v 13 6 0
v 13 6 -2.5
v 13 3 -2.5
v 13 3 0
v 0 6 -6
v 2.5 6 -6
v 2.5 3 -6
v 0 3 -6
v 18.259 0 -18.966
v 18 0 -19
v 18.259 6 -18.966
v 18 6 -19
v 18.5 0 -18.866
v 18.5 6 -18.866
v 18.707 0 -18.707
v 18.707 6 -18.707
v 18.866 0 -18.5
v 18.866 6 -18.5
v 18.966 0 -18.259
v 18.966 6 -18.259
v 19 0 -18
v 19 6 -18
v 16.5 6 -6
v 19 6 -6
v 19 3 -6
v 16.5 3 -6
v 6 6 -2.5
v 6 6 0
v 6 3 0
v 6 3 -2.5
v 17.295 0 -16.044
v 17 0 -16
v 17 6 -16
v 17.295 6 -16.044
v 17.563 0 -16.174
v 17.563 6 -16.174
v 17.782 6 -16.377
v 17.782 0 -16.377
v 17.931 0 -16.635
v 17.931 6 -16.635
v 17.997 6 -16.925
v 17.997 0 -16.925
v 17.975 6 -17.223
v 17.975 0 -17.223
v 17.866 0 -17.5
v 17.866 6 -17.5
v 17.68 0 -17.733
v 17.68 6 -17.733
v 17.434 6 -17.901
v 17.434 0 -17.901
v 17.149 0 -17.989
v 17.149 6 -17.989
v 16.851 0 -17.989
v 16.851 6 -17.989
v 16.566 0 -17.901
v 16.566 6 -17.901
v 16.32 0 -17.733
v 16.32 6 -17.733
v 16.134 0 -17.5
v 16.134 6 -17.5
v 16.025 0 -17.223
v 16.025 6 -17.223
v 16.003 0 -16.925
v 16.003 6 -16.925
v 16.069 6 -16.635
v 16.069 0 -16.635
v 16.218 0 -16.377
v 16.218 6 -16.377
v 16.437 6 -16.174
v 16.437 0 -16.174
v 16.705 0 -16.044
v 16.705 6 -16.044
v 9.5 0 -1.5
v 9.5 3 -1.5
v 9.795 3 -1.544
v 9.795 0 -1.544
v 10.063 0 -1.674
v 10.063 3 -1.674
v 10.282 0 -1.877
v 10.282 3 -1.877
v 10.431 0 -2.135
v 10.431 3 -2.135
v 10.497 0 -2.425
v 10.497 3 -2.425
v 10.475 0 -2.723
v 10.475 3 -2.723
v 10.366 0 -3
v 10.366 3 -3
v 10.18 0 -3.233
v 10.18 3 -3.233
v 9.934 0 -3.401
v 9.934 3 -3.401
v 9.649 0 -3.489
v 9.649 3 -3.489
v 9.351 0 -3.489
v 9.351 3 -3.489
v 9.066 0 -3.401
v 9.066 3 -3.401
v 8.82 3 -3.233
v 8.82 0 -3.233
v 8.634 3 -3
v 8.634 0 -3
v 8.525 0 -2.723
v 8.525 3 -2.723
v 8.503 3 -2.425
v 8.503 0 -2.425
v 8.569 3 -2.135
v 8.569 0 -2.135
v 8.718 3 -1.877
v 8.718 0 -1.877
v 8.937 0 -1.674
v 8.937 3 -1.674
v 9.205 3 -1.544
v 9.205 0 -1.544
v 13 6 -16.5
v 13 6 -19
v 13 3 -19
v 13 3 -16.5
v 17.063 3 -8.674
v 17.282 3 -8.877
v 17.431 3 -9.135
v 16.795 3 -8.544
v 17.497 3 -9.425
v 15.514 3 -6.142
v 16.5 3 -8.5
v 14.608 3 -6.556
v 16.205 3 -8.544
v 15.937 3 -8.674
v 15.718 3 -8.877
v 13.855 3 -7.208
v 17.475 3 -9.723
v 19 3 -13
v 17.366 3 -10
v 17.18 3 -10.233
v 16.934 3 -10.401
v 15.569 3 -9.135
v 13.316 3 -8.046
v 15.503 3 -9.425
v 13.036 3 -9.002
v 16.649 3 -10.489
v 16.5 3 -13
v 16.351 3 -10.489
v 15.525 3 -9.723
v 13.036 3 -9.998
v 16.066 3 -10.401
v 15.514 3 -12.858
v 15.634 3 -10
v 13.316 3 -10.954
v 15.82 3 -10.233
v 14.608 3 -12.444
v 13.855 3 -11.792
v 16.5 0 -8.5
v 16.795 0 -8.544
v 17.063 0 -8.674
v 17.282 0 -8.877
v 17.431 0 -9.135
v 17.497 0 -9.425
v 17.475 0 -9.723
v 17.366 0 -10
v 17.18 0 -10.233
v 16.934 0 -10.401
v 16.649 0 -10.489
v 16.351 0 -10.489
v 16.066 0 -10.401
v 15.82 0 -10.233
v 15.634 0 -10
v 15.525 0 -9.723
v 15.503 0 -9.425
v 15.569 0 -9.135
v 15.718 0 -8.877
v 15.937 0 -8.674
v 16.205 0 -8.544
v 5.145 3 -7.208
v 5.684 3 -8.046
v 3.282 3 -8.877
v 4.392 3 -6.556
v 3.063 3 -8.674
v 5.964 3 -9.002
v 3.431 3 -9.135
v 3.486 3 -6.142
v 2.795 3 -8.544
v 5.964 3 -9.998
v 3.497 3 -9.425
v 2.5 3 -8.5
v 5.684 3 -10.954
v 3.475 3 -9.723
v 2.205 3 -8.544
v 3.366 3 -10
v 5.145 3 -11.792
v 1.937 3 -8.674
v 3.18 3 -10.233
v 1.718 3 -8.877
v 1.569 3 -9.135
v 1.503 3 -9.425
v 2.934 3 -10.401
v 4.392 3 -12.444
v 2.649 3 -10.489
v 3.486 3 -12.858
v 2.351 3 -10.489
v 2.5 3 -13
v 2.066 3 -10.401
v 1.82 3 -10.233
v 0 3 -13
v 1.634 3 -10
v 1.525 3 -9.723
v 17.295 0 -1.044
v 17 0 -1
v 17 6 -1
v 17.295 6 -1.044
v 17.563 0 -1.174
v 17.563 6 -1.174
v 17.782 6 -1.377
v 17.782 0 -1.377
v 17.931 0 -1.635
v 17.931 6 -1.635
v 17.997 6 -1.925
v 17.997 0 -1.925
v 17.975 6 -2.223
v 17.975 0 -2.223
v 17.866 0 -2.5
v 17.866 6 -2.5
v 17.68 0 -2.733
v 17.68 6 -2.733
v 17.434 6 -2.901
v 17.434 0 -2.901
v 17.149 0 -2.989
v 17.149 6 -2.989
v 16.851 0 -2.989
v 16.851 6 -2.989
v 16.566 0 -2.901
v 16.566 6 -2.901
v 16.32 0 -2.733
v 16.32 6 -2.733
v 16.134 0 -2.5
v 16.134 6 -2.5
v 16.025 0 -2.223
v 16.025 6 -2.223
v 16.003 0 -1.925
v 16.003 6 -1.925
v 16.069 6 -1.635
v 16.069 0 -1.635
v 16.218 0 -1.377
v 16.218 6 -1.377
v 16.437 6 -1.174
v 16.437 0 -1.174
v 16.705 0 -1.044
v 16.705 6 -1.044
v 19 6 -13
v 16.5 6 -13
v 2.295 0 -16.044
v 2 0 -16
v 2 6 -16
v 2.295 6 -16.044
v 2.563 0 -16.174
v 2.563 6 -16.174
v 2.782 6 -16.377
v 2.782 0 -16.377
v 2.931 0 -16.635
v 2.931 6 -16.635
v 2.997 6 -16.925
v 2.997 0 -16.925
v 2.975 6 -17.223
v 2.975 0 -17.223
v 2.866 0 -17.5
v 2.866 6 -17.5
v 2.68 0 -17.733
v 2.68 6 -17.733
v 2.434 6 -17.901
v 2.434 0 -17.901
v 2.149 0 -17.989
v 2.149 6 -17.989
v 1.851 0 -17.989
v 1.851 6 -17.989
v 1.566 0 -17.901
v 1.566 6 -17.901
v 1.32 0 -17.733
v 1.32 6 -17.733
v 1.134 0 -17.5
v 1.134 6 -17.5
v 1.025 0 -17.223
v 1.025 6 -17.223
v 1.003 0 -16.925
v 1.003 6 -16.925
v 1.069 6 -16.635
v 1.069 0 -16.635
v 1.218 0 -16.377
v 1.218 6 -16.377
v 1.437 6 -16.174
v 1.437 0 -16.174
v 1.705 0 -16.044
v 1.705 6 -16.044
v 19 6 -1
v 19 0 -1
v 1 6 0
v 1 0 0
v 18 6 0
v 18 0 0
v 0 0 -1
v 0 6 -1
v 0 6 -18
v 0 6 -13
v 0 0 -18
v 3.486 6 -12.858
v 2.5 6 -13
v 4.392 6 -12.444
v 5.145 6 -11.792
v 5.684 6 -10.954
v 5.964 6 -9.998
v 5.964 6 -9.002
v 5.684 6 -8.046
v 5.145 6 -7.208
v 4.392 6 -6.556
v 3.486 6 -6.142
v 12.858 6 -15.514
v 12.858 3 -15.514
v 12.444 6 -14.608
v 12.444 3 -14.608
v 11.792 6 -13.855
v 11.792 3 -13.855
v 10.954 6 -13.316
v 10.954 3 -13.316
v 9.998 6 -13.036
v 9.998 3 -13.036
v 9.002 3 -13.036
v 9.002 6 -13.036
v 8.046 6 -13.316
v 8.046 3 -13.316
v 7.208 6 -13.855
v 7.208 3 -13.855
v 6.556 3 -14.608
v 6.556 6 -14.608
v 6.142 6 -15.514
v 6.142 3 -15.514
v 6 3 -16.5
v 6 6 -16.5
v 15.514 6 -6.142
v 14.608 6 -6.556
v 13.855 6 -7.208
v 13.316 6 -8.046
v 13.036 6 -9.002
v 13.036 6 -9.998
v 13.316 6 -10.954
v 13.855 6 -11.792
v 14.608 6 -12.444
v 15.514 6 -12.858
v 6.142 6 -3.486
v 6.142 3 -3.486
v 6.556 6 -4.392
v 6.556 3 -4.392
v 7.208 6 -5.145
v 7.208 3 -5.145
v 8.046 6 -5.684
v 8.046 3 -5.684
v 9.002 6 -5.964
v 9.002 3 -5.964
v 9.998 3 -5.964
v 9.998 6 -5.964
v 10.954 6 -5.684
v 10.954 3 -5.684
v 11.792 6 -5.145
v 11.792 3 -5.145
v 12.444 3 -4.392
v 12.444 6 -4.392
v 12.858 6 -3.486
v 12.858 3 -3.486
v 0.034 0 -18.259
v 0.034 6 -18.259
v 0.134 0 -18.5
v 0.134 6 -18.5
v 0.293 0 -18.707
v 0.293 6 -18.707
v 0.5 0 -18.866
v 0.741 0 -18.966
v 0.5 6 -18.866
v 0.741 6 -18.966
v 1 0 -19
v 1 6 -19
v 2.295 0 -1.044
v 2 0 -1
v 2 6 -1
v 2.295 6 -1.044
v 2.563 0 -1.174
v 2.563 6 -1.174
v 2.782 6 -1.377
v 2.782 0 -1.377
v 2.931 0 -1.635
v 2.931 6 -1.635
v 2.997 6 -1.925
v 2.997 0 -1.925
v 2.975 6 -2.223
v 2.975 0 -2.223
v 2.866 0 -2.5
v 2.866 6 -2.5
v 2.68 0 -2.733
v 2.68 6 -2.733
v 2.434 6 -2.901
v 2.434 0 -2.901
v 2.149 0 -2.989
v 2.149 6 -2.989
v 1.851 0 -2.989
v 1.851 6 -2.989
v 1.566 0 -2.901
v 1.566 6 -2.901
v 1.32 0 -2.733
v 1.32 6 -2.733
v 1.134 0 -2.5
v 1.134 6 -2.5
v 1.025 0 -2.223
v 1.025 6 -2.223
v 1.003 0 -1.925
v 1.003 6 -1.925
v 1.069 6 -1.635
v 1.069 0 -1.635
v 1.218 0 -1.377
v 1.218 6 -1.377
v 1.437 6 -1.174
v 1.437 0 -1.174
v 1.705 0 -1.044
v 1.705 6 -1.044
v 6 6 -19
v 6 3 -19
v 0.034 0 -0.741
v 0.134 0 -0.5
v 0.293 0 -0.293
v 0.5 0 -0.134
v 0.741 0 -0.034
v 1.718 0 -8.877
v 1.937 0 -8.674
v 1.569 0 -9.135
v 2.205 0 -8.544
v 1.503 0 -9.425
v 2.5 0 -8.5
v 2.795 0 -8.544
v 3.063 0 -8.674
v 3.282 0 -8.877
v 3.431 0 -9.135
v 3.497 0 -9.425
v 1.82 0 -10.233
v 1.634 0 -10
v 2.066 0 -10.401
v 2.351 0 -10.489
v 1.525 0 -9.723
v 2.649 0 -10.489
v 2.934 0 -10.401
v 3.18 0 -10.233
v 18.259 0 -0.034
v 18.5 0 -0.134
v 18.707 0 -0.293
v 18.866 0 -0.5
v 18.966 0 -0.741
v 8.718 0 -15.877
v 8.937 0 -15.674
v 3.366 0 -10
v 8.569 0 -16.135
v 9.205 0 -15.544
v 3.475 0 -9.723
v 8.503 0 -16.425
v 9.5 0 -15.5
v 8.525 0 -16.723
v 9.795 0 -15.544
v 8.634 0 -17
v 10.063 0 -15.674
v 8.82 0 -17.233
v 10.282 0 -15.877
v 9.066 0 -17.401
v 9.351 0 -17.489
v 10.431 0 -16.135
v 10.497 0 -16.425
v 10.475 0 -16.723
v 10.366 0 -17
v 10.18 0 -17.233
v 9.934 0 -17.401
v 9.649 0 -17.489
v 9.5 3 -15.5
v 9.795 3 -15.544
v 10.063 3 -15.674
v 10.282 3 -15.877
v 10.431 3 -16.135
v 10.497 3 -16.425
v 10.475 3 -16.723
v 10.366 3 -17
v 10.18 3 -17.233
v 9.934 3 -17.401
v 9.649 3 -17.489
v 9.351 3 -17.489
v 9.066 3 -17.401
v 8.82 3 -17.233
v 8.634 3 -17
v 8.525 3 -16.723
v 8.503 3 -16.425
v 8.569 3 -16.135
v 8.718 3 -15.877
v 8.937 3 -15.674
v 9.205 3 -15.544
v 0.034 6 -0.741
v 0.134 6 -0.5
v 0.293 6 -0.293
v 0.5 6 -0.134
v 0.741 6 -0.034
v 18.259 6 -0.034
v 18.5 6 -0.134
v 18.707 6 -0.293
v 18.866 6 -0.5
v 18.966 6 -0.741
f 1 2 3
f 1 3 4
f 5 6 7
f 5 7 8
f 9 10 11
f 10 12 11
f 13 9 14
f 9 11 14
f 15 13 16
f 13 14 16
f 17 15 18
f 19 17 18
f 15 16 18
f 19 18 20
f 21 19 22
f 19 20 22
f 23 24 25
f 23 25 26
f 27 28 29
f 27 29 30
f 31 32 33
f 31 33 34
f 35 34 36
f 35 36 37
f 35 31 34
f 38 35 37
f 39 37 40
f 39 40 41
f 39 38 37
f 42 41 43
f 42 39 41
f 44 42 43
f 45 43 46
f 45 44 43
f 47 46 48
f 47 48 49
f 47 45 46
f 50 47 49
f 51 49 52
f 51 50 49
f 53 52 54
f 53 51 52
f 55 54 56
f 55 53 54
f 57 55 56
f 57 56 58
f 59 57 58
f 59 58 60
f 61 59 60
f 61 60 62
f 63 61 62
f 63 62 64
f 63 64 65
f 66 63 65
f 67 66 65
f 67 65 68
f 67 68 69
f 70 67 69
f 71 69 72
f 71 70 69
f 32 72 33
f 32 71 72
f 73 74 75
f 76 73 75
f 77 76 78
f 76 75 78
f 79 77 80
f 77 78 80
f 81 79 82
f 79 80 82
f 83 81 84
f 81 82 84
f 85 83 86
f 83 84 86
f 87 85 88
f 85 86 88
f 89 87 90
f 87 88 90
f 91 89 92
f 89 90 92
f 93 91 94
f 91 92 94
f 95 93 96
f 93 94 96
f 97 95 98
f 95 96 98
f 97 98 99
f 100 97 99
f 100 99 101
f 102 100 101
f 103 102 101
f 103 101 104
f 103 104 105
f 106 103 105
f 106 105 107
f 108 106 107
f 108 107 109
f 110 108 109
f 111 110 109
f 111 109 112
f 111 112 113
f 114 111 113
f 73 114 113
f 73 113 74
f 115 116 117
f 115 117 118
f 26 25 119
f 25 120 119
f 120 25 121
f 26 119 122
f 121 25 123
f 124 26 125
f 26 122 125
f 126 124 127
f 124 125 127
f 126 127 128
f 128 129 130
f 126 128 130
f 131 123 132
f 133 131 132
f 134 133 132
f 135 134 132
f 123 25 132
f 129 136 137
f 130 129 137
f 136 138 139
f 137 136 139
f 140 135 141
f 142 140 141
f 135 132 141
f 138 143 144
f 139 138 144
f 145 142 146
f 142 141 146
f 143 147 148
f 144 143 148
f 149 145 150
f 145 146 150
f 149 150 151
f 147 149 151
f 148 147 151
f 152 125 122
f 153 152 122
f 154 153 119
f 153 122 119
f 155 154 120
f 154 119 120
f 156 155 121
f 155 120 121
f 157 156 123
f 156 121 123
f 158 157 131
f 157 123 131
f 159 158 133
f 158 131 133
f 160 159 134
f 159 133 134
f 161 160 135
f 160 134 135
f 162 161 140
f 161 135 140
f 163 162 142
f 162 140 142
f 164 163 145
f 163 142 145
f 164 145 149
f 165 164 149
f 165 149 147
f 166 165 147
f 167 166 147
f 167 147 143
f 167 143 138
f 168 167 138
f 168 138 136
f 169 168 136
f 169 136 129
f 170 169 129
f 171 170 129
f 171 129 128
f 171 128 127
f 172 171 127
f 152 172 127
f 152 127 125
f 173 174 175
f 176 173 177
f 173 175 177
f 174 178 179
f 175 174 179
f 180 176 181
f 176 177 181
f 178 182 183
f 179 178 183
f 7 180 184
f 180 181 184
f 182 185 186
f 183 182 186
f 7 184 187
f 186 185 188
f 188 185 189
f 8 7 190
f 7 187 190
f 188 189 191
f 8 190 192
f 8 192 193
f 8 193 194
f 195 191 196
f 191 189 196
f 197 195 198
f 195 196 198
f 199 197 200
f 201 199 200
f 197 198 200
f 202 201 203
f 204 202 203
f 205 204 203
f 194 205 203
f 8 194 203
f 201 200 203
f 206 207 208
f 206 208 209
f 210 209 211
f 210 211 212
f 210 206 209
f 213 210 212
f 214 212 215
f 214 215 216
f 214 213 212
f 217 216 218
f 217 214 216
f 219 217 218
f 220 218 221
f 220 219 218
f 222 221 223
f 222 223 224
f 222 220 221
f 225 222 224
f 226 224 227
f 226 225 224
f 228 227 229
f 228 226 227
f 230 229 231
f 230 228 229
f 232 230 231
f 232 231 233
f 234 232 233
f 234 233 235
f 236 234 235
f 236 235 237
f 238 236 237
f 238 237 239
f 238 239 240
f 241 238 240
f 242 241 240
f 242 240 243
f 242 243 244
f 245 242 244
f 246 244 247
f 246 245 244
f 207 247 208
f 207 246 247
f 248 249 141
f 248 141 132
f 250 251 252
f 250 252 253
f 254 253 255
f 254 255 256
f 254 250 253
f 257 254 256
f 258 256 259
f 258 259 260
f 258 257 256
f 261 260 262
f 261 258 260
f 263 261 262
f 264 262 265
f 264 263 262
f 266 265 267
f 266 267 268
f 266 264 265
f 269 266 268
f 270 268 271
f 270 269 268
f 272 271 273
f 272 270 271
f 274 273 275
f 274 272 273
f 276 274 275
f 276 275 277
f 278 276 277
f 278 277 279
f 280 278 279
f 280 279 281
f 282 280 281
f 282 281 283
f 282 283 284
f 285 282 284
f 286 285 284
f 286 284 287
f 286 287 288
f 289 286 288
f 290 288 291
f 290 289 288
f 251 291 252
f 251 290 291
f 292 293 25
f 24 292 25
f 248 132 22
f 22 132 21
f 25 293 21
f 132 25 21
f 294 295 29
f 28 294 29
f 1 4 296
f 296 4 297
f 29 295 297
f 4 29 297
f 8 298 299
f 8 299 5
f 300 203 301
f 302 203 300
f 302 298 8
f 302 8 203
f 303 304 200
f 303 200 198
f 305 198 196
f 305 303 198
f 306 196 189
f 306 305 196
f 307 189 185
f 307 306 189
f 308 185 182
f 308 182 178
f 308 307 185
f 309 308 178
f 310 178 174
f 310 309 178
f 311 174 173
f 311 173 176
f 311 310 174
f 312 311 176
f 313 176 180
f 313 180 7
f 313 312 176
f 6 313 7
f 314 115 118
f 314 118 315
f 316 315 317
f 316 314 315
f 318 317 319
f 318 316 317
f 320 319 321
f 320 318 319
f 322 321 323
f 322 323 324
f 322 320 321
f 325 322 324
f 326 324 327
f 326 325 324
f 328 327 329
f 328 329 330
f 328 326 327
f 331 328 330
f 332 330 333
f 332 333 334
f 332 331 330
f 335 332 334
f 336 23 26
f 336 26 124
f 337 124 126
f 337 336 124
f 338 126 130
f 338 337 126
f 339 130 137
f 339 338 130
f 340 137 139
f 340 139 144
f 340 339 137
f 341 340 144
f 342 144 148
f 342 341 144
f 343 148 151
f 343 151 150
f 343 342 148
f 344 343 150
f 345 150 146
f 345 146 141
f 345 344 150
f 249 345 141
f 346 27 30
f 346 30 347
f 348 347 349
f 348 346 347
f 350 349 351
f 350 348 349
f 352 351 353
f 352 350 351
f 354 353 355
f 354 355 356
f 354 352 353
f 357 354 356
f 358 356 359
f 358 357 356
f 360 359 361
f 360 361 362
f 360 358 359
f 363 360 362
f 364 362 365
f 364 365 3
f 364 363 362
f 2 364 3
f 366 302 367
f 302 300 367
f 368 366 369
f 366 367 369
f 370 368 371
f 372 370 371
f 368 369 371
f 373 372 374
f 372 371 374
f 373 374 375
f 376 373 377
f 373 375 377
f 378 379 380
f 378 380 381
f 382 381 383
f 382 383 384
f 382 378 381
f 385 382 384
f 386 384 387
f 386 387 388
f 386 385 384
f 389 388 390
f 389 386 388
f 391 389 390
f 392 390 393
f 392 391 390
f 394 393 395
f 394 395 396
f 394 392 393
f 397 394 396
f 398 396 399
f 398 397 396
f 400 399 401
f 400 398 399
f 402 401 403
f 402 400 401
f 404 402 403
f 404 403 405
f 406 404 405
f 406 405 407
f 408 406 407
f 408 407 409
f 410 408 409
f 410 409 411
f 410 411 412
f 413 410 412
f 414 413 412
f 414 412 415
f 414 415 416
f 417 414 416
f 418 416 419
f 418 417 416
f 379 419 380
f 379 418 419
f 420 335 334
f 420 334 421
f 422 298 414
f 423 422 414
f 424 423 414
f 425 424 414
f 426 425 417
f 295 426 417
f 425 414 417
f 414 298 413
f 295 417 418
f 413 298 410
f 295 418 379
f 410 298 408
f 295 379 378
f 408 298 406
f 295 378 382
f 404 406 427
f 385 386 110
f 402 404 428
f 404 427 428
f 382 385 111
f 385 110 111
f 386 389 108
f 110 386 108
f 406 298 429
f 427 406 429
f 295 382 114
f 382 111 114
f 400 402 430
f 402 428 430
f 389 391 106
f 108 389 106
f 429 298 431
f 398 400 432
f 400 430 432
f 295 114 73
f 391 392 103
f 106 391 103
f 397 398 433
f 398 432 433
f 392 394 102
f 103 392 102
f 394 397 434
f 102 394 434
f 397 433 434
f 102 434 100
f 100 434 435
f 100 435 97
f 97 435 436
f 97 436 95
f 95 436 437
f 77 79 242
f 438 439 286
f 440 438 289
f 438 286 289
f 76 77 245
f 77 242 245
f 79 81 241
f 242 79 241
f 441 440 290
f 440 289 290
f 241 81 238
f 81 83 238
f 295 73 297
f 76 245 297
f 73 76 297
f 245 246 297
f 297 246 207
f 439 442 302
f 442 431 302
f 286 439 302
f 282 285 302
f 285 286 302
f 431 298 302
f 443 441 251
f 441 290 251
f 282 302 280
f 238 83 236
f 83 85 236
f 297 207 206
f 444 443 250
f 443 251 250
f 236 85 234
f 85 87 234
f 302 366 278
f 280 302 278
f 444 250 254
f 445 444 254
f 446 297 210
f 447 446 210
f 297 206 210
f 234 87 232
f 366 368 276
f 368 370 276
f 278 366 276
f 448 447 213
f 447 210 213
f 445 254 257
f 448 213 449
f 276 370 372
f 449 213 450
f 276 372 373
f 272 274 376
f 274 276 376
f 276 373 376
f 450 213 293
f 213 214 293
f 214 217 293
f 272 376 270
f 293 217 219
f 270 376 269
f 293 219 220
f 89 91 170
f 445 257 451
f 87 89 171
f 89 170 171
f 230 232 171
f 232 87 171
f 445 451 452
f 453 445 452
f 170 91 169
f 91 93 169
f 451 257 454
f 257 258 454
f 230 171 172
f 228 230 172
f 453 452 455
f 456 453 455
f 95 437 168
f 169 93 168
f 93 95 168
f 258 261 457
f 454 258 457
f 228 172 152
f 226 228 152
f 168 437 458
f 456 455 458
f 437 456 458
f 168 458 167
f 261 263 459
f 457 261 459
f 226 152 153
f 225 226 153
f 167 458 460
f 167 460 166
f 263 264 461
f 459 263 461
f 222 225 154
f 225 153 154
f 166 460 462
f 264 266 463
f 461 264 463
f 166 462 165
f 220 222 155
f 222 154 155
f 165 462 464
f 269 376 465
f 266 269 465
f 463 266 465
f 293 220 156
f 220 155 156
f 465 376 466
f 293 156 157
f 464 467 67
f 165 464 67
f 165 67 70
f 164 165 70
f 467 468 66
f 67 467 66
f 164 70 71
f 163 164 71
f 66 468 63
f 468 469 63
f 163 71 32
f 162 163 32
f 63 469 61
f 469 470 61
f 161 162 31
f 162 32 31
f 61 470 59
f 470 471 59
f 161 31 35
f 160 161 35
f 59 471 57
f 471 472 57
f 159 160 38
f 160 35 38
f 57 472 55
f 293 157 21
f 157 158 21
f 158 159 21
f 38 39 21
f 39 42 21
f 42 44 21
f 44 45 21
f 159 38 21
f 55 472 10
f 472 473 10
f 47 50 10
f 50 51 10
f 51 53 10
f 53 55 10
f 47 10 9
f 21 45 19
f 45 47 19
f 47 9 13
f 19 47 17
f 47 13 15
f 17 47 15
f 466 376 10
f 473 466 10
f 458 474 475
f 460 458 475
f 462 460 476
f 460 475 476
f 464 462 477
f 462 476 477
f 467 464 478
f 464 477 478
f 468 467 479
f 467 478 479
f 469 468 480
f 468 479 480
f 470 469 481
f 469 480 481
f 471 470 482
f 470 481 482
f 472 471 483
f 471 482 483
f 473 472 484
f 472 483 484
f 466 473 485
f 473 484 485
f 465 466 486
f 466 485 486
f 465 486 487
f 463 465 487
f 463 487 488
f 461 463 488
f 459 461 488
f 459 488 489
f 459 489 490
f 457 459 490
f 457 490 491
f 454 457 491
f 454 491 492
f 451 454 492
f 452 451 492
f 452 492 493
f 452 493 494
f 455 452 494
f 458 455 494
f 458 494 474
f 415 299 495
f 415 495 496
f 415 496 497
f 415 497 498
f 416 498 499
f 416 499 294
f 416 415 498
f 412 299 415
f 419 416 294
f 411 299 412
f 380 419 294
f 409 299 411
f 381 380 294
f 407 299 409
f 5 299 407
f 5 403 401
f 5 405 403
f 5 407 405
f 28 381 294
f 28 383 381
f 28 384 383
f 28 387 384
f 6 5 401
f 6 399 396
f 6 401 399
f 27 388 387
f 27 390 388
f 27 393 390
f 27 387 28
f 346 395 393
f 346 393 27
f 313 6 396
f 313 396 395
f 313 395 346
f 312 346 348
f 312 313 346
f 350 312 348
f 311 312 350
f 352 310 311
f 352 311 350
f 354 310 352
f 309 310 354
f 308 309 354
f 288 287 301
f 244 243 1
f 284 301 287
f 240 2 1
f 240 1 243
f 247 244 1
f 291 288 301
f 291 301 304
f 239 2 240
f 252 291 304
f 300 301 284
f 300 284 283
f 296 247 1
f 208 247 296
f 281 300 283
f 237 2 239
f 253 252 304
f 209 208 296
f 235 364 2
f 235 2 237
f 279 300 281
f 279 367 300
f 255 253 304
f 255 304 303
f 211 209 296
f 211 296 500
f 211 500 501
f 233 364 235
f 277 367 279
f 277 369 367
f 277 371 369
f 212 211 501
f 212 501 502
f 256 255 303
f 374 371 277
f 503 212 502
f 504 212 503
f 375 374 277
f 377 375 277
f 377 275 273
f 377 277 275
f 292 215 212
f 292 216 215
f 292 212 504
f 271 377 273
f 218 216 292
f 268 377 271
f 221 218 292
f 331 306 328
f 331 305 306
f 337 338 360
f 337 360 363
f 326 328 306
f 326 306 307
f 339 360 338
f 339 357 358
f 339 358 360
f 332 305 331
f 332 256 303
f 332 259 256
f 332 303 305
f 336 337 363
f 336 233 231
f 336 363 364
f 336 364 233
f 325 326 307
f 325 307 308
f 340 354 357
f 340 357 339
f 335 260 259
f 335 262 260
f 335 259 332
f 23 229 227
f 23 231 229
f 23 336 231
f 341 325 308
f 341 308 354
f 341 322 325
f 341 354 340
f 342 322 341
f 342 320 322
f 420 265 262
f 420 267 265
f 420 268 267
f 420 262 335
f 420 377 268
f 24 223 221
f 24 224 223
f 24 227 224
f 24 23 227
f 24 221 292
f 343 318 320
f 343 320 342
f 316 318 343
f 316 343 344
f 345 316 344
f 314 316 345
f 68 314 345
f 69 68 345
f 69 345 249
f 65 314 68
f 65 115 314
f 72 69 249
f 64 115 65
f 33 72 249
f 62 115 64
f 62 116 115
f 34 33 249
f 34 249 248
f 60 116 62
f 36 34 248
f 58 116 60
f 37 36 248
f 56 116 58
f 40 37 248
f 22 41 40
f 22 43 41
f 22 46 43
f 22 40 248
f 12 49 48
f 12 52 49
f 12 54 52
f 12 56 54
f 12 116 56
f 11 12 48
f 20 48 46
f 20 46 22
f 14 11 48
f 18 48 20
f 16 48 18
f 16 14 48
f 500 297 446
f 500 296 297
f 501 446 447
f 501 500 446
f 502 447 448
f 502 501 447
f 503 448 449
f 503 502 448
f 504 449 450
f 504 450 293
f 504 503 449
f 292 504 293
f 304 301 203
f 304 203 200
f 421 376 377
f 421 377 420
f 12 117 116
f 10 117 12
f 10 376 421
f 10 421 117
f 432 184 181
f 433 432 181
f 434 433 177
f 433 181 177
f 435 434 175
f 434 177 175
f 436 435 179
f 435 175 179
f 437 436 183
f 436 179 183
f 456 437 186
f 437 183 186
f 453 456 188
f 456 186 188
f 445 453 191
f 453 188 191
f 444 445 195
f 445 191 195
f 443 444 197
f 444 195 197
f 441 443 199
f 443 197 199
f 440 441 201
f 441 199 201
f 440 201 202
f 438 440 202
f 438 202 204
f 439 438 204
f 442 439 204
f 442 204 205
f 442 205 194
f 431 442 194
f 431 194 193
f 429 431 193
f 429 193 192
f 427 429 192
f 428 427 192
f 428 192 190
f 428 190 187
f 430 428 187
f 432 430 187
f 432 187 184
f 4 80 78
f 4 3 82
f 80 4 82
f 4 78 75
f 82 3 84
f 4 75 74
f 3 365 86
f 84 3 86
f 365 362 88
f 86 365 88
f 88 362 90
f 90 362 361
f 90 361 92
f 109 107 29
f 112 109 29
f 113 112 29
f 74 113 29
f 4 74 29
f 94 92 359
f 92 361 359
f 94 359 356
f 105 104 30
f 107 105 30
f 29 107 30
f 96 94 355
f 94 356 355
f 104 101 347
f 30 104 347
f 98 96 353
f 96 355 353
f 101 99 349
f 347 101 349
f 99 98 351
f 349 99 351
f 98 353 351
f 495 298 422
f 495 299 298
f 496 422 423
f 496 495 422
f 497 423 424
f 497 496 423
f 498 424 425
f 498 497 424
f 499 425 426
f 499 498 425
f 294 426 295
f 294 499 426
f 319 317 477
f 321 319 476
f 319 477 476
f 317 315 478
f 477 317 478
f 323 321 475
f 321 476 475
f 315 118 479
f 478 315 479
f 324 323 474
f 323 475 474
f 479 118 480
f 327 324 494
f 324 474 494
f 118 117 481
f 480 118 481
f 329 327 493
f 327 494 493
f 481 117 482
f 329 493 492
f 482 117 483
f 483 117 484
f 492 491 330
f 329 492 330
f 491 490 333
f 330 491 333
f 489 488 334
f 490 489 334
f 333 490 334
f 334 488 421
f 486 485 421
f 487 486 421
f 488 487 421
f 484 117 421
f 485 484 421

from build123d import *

# Parameters (mm, degrees)
SKETCH_1_W          = 19
SKETCH_1_H          = 19
SKETCH_1_R          = 1
EXTRUDE_1_DEPTH     = 6
FILLET_1_R          = 1
SKETCH_2_R          = 1
CUT_EXTRUDE_1_DEPTH = 28.531799796
CUT_EXTRUDE_2_DEPTH = 3


with BuildPart() as part:
    # Эскиз1 → Бобышка-Вытянуть1 (new body)
    with BuildSketch(Plane(origin=(0, 0, 0), x_dir=(1, 0, 0), z_dir=(0, 1, 0))):
        with Locations((9.5, 9.5)):
            Rectangle(SKETCH_1_W, SKETCH_1_H)
        with Locations(Location((2, 17, 0), (0, 0, 270))):
            Circle(SKETCH_1_R, mode=Mode.SUBTRACT)
        with Locations(Location((17, 17, 0), (0, 0, 270))):
            Circle(SKETCH_1_R, mode=Mode.SUBTRACT)
        with Locations(Location((17, 2, 0), (0, 0, 270))):
            Circle(SKETCH_1_R, mode=Mode.SUBTRACT)
        with Locations(Location((2, 2, 0), (0, 0, 270))):
            Circle(SKETCH_1_R, mode=Mode.SUBTRACT)
    extrude(amount=EXTRUDE_1_DEPTH)

    # Скругление1
    fillet_1_edges = [part.edges().sort_by_distance(p)[0] for p in [
        (0, 3, -19),
        (19, 3, -19),
        (19, 3, 0),
        (0, 3, 0),
    ]]
    fillet(fillet_1_edges, radius=FILLET_1_R)

    # Эскиз2 → Вырез-Вытянуть1 (cut, through all)
    with BuildSketch(Plane(origin=(0, 6, 0), x_dir=(1, 0, 0), z_dir=(0, 1, 0))):
        with Locations(Location((9.5, 16.5, 0), (0, 0, 270))):
            Circle(SKETCH_2_R)
        with Locations(Location((16.5, 9.5, 0), (0, 0, 270))):
            Circle(SKETCH_2_R)
        with Locations(Location((9.5, 2.5, 0), (0, 0, 270))):
            Circle(SKETCH_2_R)
        with Locations(Location((2.5, 9.5, 0), (0, 0, 270))):
            Circle(SKETCH_2_R)
    extrude(amount=-CUT_EXTRUDE_1_DEPTH, mode=Mode.SUBTRACT)

    # Эскиз3 → Вырез-Вытянуть2 (cut)
    with BuildSketch(Plane(origin=(0, 6, 0), x_dir=(1, 0, 0), z_dir=(0, 1, 0))):
        with BuildLine():
            Line((6, 16.5), (6, 21.9359466))
            Line((6, 21.9359466), (13, 21.9359466))
            Line((13, 21.9359466), (13, 16.5))
            ThreePointArc((13, 16.5), (9.5, 13), (6, 16.5))
        make_face()
        with BuildLine():
            Line((13, 2.5), (13, -5.102937302))
            Line((13, -5.102937302), (6, -4.799159297))
            Line((6, -4.799159297), (6, 2.5))
            ThreePointArc((6, 2.5), (9.5, 6), (13, 2.5))
        make_face()
        with BuildLine():
            Line((2.5, 6), (-3.698936954, 6))
            Line((-3.698936954, 6), (-3.698936954, 13))
            Line((-3.698936954, 13), (2.5, 13))
            ThreePointArc((2.5, 13), (6, 9.5), (2.5, 6))
        make_face()
        with BuildLine():
            Line((22.836899795, 13), (22.836899795, 6))
            Line((22.836899795, 6), (16.5, 6))
            ThreePointArc((16.5, 6), (13, 9.5), (16.5, 13))
            Line((16.5, 13), (22.836899795, 13))
        make_face()
    extrude(amount=-CUT_EXTRUDE_2_DEPTH, mode=Mode.SUBTRACT)


solid = part.part
